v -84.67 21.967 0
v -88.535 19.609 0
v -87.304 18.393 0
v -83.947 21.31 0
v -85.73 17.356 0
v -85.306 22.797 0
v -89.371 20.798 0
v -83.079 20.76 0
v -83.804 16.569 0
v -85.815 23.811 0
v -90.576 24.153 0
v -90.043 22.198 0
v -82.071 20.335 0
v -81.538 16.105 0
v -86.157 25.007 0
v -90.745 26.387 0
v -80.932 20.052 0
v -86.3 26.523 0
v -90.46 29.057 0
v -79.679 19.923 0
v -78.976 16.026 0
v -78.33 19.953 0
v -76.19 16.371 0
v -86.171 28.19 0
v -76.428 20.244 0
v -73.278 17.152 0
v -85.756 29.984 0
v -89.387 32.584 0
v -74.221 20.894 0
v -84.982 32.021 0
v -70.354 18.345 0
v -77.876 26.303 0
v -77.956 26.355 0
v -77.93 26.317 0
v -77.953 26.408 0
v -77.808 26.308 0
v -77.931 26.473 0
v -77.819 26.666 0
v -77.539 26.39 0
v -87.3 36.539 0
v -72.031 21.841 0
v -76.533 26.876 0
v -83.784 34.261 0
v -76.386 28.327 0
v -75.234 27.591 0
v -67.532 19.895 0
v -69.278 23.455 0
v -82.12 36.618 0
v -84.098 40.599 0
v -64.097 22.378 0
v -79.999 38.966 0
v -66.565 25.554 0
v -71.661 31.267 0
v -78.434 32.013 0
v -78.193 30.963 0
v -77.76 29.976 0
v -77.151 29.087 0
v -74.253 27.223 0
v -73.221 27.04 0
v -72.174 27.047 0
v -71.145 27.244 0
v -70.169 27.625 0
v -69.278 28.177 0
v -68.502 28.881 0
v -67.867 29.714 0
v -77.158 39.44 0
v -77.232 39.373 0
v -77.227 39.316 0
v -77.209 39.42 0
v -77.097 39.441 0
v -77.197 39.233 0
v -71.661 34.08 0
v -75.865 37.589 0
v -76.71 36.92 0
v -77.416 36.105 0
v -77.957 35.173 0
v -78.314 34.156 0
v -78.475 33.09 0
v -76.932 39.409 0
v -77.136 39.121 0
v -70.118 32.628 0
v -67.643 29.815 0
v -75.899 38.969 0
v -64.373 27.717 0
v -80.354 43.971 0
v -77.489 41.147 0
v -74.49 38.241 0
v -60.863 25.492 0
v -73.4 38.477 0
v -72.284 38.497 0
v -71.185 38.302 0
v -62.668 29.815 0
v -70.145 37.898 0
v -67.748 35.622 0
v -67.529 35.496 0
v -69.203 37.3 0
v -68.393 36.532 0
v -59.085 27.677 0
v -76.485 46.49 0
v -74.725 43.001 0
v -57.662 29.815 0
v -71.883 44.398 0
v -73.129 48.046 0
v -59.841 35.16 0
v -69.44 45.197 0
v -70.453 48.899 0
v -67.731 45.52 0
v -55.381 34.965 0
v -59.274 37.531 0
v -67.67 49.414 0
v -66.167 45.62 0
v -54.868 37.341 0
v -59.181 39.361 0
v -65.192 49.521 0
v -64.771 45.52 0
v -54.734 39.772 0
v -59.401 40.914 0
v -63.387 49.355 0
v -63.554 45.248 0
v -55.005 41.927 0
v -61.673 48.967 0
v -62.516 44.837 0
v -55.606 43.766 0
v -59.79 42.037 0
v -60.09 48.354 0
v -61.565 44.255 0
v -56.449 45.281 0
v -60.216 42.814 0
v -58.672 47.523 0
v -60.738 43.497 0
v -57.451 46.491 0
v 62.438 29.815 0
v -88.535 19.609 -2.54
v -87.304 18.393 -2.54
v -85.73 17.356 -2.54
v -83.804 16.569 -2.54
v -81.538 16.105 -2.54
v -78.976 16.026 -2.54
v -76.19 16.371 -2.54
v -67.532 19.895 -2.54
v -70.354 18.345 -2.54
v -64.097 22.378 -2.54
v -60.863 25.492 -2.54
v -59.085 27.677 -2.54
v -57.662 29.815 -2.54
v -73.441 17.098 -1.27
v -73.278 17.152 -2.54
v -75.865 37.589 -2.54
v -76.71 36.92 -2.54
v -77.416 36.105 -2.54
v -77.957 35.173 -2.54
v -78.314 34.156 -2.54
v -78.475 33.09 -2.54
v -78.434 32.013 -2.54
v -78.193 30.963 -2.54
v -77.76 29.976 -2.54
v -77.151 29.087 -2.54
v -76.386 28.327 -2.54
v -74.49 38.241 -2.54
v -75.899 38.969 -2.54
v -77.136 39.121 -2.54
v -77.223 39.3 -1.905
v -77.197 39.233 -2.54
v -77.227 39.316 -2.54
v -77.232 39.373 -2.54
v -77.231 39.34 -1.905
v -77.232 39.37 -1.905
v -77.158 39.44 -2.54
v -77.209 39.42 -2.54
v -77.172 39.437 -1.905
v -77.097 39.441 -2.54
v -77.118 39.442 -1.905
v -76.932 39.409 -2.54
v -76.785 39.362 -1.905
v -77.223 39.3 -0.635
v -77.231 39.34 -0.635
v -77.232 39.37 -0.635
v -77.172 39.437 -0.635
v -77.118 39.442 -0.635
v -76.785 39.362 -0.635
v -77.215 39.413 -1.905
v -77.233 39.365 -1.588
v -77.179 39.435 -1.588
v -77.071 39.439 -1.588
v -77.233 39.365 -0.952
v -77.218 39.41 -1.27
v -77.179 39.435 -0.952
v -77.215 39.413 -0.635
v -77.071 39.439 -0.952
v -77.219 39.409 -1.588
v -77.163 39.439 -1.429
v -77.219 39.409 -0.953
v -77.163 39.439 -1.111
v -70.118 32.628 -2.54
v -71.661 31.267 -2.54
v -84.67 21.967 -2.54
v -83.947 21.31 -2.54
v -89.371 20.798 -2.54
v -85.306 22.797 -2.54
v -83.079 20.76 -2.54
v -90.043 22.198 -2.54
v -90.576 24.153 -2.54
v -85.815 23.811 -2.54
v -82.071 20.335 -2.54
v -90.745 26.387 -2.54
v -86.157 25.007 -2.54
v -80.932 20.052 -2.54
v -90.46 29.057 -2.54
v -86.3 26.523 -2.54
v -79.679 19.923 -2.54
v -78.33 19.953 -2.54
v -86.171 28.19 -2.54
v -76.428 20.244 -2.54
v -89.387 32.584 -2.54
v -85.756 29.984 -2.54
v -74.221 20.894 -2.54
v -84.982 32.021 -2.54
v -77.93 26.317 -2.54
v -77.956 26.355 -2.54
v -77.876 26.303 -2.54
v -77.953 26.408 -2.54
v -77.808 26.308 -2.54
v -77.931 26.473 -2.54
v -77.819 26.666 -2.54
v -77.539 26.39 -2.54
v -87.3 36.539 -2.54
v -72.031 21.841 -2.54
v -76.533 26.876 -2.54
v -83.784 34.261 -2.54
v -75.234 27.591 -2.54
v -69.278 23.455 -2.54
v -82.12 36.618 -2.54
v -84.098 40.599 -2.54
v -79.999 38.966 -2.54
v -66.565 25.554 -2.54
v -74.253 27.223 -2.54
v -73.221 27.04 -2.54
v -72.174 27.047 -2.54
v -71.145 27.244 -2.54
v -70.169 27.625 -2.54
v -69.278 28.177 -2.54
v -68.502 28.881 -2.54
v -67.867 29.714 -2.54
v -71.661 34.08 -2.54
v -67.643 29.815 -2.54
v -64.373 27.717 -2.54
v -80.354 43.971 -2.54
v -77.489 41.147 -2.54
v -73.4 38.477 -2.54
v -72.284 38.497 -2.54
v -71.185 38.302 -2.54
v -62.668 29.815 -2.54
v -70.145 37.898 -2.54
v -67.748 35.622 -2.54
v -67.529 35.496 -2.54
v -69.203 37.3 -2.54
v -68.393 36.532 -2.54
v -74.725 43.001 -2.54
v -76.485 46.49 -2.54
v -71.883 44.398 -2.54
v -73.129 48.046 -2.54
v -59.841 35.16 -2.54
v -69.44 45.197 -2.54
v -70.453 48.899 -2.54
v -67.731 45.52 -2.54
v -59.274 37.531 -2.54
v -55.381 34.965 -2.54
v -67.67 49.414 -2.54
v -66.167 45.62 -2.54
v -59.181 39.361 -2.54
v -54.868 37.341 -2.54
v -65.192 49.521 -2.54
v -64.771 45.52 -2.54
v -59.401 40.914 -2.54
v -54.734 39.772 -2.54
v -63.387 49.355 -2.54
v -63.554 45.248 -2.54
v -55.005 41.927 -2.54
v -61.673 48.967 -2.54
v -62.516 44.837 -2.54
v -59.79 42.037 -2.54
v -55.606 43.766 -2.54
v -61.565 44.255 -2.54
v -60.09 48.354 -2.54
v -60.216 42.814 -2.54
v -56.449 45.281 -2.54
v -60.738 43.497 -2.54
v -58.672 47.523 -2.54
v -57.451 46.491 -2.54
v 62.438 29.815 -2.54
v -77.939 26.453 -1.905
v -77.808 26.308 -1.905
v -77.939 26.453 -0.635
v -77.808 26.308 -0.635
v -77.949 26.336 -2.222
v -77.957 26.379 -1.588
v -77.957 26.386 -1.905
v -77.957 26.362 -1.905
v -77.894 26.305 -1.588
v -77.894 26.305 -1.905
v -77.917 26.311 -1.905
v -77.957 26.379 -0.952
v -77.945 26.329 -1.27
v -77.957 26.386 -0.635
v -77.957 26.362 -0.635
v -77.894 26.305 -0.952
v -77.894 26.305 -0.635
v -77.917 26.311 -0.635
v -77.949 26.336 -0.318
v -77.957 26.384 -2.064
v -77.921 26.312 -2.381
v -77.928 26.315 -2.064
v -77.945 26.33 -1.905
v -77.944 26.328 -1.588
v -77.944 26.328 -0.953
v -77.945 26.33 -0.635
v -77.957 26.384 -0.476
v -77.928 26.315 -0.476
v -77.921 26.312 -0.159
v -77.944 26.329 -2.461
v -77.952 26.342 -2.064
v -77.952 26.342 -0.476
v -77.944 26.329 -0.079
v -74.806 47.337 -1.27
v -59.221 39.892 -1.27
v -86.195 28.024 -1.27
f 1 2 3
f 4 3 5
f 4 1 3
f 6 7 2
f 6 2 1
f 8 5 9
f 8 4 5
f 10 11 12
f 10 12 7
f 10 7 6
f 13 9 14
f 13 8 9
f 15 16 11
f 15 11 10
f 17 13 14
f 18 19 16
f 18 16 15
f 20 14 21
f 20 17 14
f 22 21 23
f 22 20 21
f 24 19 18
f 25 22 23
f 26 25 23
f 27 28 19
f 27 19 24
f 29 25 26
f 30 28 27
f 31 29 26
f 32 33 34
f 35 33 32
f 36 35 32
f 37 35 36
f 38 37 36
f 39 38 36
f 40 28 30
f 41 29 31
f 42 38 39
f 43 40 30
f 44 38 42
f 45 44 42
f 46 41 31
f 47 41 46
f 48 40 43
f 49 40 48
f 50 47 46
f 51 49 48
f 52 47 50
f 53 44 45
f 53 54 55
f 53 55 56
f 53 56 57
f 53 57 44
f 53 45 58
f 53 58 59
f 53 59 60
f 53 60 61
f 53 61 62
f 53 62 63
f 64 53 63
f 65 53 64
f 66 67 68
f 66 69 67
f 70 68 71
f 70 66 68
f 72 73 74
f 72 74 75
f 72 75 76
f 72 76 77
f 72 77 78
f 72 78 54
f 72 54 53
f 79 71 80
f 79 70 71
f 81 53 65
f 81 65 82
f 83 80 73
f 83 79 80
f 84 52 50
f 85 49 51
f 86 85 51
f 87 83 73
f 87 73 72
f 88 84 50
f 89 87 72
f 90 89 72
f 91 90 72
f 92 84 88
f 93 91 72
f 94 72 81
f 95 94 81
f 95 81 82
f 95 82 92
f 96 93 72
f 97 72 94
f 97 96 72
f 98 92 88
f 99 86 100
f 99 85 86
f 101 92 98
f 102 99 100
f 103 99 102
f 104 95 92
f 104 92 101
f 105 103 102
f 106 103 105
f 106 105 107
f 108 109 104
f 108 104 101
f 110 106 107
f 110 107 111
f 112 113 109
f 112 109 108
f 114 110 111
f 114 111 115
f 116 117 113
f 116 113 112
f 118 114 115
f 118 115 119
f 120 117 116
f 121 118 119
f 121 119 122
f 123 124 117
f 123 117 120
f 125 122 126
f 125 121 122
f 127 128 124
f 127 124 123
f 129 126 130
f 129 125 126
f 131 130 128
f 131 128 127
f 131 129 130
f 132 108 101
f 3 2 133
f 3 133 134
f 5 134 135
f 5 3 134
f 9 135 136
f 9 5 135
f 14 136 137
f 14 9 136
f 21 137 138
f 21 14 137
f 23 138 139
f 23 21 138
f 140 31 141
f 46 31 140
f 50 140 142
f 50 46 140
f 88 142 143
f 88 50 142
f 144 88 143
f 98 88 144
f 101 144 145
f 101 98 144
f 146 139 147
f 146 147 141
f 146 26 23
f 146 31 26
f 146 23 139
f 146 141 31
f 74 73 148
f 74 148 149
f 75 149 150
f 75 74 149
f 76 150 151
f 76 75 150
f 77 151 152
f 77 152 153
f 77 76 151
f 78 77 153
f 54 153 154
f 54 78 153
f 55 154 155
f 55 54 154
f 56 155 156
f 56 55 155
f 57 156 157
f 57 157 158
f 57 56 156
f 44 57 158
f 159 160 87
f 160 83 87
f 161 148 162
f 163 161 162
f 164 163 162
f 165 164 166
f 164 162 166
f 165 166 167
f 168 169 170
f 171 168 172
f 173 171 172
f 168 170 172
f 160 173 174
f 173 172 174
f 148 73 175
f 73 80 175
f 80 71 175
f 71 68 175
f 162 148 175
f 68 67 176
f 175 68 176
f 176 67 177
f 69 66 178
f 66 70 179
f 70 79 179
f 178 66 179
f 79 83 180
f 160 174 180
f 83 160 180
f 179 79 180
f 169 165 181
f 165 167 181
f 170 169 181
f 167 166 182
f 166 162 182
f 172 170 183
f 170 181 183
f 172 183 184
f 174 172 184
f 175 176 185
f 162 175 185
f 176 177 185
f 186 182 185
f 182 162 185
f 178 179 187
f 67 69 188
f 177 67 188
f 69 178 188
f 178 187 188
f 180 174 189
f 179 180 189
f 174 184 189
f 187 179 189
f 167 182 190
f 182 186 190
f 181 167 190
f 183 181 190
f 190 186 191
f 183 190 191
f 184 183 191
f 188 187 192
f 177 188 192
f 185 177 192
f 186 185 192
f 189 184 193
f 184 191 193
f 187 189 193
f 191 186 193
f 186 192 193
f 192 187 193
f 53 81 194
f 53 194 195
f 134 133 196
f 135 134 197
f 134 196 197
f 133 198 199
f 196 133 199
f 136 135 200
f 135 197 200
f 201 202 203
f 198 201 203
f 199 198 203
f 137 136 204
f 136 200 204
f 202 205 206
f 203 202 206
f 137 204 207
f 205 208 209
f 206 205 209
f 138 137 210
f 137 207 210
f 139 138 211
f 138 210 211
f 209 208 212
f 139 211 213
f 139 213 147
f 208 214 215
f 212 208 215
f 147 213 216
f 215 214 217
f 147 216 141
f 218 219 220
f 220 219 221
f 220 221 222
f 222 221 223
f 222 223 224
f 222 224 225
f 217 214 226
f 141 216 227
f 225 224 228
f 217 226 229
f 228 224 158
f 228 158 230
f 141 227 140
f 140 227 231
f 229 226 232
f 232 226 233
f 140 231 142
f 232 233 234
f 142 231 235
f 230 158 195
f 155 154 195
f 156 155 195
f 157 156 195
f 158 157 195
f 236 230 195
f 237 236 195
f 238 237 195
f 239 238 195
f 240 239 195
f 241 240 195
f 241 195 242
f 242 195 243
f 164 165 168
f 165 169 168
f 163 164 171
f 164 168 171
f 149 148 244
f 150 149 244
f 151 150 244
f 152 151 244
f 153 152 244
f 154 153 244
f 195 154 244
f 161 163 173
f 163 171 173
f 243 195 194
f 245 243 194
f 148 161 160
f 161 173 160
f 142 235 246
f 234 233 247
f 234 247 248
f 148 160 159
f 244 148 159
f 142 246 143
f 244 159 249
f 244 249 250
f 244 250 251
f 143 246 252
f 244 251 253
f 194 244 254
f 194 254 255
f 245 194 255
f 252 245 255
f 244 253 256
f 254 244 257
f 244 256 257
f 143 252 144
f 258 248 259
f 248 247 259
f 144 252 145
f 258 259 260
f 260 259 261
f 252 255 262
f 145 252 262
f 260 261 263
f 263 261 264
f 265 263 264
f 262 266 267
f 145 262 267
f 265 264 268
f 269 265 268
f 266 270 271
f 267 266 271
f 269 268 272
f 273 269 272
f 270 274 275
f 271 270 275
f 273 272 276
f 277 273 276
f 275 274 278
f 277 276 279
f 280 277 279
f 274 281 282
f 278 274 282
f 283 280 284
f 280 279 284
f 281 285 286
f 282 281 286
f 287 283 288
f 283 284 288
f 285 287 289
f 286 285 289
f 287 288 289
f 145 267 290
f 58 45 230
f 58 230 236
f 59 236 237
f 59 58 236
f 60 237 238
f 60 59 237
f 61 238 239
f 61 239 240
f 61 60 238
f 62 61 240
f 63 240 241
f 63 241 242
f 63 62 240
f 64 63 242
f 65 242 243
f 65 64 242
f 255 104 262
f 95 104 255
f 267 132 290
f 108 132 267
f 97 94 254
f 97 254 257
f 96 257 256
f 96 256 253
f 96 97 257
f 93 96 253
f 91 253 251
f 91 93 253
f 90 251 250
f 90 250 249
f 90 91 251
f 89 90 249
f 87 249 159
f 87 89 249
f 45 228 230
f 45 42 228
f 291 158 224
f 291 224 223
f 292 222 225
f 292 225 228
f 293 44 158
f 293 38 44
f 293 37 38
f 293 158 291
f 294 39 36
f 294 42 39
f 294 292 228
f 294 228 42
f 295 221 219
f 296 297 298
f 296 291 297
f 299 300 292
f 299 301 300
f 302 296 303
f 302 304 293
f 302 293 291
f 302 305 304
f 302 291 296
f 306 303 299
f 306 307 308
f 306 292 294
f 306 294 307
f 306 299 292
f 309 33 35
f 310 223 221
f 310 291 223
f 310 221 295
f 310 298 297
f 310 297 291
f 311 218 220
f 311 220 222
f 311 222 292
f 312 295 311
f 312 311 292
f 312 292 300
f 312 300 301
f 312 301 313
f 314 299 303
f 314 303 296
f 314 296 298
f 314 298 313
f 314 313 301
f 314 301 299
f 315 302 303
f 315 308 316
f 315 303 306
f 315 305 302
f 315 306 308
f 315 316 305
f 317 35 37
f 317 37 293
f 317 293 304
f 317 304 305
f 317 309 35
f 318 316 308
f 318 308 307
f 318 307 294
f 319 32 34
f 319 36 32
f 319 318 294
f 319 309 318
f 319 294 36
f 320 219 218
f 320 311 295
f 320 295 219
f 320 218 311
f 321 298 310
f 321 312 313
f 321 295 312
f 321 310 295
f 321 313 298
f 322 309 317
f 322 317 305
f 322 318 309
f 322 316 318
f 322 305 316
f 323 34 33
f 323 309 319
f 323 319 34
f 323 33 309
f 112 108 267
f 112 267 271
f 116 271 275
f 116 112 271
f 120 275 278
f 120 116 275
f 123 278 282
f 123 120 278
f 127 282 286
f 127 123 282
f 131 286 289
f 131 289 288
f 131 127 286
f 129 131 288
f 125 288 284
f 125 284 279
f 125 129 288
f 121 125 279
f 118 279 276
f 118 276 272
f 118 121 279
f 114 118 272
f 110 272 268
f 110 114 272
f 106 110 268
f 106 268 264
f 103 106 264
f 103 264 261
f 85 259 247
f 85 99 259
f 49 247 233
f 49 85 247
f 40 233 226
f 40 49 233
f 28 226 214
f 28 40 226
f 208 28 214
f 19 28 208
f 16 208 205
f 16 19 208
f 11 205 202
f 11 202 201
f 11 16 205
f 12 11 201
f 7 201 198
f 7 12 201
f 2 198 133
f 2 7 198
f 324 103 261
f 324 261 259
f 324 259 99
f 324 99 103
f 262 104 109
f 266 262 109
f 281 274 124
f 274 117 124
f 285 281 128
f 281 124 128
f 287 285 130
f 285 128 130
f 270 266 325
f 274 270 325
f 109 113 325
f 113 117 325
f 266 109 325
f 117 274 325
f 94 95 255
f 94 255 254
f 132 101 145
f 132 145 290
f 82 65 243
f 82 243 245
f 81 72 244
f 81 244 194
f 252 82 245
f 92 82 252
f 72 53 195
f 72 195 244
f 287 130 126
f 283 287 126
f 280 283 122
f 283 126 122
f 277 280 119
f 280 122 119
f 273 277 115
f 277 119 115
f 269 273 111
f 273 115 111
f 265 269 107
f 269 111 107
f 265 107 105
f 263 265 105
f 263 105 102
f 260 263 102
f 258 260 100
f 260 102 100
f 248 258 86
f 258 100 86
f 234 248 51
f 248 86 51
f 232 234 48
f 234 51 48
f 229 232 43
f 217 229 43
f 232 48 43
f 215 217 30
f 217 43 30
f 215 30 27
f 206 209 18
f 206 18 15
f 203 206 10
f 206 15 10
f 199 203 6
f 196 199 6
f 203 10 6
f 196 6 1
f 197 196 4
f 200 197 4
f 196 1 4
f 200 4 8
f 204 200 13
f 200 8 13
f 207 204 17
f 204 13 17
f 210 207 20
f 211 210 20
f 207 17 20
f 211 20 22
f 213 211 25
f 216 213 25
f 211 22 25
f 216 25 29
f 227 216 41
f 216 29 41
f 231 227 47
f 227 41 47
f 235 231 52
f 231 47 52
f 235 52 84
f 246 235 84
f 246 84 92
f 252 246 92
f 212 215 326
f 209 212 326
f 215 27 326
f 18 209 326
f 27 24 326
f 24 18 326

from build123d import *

# Parameters (mm, degrees)
F1_DEPTH = 2.54


# Not quite as in the source:
# - a feature names something its author has since deleted; it is built from what else it names


with BuildPart() as f1:
    # F0 (on Top) → F1 (new body)
    with BuildSketch(Plane.XY):
        with BuildLine():
            ThreePointArc((-75.8652047354, 37.588779241), (-75.1994350162, 37.9605298718), (-74.4903137067, 38.240877547))
            add(Edge.make_bspline(
                [(-75.8652047354, 37.588779241), (-76.604224067, 38.4137884205), (-78.1981423403, 40.1935134784), (-75.778702664, 38.920881298), (-74.4903137067, 38.240877547)],
                knots=[0, 0, 0, 0, 0.4664775591, 1, 1, 1, 1], degree=3))
        make_face()
        with BuildLine():
            add(Edge.make_bspline(
                [(-76.3861294689, 28.3272341561), (-77.2286455281, 27.4100753254), (-78.989872456, 25.4917535729), (-76.5188170846, 26.874194918), (-75.2340137405, 27.5907563812)],
                knots=[0, 0, 0, 0, 0.4793293454, 1, 1, 1, 1], degree=3))
            ThreePointArc((-75.2340137405, 27.5907563812), (-75.8320510764, 27.9246114815), (-76.3861294689, 28.3272341561))
        make_face()
        with BuildLine():
            Line((-59.8411278552, 35.1595323087), (-55.3810254851, 34.9645812086))
            add(Edge.make_bspline(
                [(-55.3810254851, 34.9645812086), (-48.2332464618, 59.6436415888), (-74.8055976533, 47.3367482699), (-101.3779488448, 35.029854951), (-88.5350008625, 19.6094312212)],
                knots=[2.3703033236, 2.3703033236, 2.3703033236, 4.3267443154, 4.3267443154, 6.2831853072, 6.2831853072, 6.2831853072], degree=2, weights=[1, 0.5584995375, 1, 0.5584995375, 1]))
            add(Edge.make_bspline(
                [(-88.5350008625, 19.6094312212), (-74.1070210535, 2.2858726015), (-57.6621755507, 29.8147089779)],
                knots=[0, 0, 0, 2.061745172, 2.061745172, 2.061745172], degree=2, weights=[1, 0.514070582, 1]))
            Line((-57.6621755507, 29.8147089779), (-62.6683754349, 29.8147089779))
            add(Edge.make_bspline(
                [(-60.7383996248, 43.4973761439), (-80.8420671588, 65.9766930493), (-86.1954495571, 28.0236010013), (-91.5488319555, -9.9294910468), (-62.6683754349, 29.8147089779)],
                knots=[0, 0, 0, 2.5317574132, 2.5317574132, 5.0635148264, 5.0635148264, 5.0635148264], degree=2, weights=[1, 0.3002145965, 1, 0.3002145965, 1]))
            add(Edge.make_bspline(
                [(-59.8411278552, 35.1595323087), (-58.0608375325, 40.5034066751), (-60.7383996248, 43.4973761439)],
                knots=[5.4825336434, 5.4825336434, 5.4825336434, 6.2831853072, 6.2831853072, 6.2831853072], degree=2, weights=[1, 0.9209340602, 1]))
        make_face()
        with BuildLine():
            add(Edge.make_bspline(
                [(-57.6621755507, 29.8147089779), (-56.1294482804, 32.3805098074), (-55.3810254851, 34.9645812086)],
                knots=[2.061745172, 2.061745172, 2.061745172, 2.3703033236, 2.3703033236, 2.3703033236], degree=2, weights=[1, 0.9881225704, 1]))
            Line((-55.3810254851, 34.9645812086), (-59.8411278552, 35.1595323087))
            add(Edge.make_bspline(
                [(-62.6683754349, 29.8147089779), (-60.7356522323, 32.4744500905), (-59.8411278552, 35.1595323087)],
                knots=[5.0635148264, 5.0635148264, 5.0635148264, 5.4825336434, 5.4825336434, 5.4825336434], degree=2, weights=[1, 0.9781330657, 1]))
            Line((-62.6683754349, 29.8147089779), (-57.6621755507, 29.8147089779))
        make_face()
        with BuildLine():
            Line((-57.6621755507, 29.8147089779), (62.438044697, 29.8147089779))
            Line((62.438044697, 29.8147089779), (-55.3810254851, 34.9645812086))
            add(Edge.make_bspline(
                [(-57.6621755507, 29.8147089779), (-56.1294482804, 32.3805098074), (-55.3810254851, 34.9645812086)],
                knots=[2.061745172, 2.061745172, 2.061745172, 2.3703033236, 2.3703033236, 2.3703033236], degree=2, weights=[1, 0.9881225704, 1]))
        make_face()
        with BuildLine():
            add(Edge.make_bspline(
                [(-62.6683754349, 29.8147089779), (-60.7356522323, 32.4744500905), (-59.8411278552, 35.1595323087)],
                knots=[5.0635148264, 5.0635148264, 5.0635148264, 5.4825336434, 5.4825336434, 5.4825336434], degree=2, weights=[1, 0.9781330657, 1]))
            Line((-59.8411278552, 35.1595323087), (-67.5292090986, 35.4955783838))
            Line((-67.5292090986, 35.4955783838), (-67.74773377, 35.6220386313))
            ThreePointArc((-67.74773377, 35.6220386313), (-70.6554109693, 38.1250962836), (-74.4903137067, 38.240877547))
            ThreePointArc((-74.4903137067, 38.240877547), (-75.1994350162, 37.9605298718), (-75.8652047354, 37.588779241))
            ThreePointArc((-75.8652047354, 37.588779241), (-78.4749567451, 33.0901448105), (-76.3861294689, 28.3272341561))
            ThreePointArc((-76.3861294689, 28.3272341561), (-75.8320510764, 27.9246114815), (-75.2340137405, 27.5907563812))
            ThreePointArc((-75.2340137405, 27.5907563812), (-71.1447945546, 27.2444669), (-67.8669635062, 29.7137691443))
            Line((-67.8669635062, 29.7137691443), (-67.6427260041, 29.8147089779))
            Line((-67.6427260041, 29.8147089779), (-62.6683754349, 29.8147089779))
        make_face()
        Polygon((-70.1181069016, 32.6280742884), (-71.660593152, 31.267054379), (-71.660593152, 34.0798310935), align=None, mode=Mode.SUBTRACT)
    extrude(amount=-F1_DEPTH)


solid = f1.part
